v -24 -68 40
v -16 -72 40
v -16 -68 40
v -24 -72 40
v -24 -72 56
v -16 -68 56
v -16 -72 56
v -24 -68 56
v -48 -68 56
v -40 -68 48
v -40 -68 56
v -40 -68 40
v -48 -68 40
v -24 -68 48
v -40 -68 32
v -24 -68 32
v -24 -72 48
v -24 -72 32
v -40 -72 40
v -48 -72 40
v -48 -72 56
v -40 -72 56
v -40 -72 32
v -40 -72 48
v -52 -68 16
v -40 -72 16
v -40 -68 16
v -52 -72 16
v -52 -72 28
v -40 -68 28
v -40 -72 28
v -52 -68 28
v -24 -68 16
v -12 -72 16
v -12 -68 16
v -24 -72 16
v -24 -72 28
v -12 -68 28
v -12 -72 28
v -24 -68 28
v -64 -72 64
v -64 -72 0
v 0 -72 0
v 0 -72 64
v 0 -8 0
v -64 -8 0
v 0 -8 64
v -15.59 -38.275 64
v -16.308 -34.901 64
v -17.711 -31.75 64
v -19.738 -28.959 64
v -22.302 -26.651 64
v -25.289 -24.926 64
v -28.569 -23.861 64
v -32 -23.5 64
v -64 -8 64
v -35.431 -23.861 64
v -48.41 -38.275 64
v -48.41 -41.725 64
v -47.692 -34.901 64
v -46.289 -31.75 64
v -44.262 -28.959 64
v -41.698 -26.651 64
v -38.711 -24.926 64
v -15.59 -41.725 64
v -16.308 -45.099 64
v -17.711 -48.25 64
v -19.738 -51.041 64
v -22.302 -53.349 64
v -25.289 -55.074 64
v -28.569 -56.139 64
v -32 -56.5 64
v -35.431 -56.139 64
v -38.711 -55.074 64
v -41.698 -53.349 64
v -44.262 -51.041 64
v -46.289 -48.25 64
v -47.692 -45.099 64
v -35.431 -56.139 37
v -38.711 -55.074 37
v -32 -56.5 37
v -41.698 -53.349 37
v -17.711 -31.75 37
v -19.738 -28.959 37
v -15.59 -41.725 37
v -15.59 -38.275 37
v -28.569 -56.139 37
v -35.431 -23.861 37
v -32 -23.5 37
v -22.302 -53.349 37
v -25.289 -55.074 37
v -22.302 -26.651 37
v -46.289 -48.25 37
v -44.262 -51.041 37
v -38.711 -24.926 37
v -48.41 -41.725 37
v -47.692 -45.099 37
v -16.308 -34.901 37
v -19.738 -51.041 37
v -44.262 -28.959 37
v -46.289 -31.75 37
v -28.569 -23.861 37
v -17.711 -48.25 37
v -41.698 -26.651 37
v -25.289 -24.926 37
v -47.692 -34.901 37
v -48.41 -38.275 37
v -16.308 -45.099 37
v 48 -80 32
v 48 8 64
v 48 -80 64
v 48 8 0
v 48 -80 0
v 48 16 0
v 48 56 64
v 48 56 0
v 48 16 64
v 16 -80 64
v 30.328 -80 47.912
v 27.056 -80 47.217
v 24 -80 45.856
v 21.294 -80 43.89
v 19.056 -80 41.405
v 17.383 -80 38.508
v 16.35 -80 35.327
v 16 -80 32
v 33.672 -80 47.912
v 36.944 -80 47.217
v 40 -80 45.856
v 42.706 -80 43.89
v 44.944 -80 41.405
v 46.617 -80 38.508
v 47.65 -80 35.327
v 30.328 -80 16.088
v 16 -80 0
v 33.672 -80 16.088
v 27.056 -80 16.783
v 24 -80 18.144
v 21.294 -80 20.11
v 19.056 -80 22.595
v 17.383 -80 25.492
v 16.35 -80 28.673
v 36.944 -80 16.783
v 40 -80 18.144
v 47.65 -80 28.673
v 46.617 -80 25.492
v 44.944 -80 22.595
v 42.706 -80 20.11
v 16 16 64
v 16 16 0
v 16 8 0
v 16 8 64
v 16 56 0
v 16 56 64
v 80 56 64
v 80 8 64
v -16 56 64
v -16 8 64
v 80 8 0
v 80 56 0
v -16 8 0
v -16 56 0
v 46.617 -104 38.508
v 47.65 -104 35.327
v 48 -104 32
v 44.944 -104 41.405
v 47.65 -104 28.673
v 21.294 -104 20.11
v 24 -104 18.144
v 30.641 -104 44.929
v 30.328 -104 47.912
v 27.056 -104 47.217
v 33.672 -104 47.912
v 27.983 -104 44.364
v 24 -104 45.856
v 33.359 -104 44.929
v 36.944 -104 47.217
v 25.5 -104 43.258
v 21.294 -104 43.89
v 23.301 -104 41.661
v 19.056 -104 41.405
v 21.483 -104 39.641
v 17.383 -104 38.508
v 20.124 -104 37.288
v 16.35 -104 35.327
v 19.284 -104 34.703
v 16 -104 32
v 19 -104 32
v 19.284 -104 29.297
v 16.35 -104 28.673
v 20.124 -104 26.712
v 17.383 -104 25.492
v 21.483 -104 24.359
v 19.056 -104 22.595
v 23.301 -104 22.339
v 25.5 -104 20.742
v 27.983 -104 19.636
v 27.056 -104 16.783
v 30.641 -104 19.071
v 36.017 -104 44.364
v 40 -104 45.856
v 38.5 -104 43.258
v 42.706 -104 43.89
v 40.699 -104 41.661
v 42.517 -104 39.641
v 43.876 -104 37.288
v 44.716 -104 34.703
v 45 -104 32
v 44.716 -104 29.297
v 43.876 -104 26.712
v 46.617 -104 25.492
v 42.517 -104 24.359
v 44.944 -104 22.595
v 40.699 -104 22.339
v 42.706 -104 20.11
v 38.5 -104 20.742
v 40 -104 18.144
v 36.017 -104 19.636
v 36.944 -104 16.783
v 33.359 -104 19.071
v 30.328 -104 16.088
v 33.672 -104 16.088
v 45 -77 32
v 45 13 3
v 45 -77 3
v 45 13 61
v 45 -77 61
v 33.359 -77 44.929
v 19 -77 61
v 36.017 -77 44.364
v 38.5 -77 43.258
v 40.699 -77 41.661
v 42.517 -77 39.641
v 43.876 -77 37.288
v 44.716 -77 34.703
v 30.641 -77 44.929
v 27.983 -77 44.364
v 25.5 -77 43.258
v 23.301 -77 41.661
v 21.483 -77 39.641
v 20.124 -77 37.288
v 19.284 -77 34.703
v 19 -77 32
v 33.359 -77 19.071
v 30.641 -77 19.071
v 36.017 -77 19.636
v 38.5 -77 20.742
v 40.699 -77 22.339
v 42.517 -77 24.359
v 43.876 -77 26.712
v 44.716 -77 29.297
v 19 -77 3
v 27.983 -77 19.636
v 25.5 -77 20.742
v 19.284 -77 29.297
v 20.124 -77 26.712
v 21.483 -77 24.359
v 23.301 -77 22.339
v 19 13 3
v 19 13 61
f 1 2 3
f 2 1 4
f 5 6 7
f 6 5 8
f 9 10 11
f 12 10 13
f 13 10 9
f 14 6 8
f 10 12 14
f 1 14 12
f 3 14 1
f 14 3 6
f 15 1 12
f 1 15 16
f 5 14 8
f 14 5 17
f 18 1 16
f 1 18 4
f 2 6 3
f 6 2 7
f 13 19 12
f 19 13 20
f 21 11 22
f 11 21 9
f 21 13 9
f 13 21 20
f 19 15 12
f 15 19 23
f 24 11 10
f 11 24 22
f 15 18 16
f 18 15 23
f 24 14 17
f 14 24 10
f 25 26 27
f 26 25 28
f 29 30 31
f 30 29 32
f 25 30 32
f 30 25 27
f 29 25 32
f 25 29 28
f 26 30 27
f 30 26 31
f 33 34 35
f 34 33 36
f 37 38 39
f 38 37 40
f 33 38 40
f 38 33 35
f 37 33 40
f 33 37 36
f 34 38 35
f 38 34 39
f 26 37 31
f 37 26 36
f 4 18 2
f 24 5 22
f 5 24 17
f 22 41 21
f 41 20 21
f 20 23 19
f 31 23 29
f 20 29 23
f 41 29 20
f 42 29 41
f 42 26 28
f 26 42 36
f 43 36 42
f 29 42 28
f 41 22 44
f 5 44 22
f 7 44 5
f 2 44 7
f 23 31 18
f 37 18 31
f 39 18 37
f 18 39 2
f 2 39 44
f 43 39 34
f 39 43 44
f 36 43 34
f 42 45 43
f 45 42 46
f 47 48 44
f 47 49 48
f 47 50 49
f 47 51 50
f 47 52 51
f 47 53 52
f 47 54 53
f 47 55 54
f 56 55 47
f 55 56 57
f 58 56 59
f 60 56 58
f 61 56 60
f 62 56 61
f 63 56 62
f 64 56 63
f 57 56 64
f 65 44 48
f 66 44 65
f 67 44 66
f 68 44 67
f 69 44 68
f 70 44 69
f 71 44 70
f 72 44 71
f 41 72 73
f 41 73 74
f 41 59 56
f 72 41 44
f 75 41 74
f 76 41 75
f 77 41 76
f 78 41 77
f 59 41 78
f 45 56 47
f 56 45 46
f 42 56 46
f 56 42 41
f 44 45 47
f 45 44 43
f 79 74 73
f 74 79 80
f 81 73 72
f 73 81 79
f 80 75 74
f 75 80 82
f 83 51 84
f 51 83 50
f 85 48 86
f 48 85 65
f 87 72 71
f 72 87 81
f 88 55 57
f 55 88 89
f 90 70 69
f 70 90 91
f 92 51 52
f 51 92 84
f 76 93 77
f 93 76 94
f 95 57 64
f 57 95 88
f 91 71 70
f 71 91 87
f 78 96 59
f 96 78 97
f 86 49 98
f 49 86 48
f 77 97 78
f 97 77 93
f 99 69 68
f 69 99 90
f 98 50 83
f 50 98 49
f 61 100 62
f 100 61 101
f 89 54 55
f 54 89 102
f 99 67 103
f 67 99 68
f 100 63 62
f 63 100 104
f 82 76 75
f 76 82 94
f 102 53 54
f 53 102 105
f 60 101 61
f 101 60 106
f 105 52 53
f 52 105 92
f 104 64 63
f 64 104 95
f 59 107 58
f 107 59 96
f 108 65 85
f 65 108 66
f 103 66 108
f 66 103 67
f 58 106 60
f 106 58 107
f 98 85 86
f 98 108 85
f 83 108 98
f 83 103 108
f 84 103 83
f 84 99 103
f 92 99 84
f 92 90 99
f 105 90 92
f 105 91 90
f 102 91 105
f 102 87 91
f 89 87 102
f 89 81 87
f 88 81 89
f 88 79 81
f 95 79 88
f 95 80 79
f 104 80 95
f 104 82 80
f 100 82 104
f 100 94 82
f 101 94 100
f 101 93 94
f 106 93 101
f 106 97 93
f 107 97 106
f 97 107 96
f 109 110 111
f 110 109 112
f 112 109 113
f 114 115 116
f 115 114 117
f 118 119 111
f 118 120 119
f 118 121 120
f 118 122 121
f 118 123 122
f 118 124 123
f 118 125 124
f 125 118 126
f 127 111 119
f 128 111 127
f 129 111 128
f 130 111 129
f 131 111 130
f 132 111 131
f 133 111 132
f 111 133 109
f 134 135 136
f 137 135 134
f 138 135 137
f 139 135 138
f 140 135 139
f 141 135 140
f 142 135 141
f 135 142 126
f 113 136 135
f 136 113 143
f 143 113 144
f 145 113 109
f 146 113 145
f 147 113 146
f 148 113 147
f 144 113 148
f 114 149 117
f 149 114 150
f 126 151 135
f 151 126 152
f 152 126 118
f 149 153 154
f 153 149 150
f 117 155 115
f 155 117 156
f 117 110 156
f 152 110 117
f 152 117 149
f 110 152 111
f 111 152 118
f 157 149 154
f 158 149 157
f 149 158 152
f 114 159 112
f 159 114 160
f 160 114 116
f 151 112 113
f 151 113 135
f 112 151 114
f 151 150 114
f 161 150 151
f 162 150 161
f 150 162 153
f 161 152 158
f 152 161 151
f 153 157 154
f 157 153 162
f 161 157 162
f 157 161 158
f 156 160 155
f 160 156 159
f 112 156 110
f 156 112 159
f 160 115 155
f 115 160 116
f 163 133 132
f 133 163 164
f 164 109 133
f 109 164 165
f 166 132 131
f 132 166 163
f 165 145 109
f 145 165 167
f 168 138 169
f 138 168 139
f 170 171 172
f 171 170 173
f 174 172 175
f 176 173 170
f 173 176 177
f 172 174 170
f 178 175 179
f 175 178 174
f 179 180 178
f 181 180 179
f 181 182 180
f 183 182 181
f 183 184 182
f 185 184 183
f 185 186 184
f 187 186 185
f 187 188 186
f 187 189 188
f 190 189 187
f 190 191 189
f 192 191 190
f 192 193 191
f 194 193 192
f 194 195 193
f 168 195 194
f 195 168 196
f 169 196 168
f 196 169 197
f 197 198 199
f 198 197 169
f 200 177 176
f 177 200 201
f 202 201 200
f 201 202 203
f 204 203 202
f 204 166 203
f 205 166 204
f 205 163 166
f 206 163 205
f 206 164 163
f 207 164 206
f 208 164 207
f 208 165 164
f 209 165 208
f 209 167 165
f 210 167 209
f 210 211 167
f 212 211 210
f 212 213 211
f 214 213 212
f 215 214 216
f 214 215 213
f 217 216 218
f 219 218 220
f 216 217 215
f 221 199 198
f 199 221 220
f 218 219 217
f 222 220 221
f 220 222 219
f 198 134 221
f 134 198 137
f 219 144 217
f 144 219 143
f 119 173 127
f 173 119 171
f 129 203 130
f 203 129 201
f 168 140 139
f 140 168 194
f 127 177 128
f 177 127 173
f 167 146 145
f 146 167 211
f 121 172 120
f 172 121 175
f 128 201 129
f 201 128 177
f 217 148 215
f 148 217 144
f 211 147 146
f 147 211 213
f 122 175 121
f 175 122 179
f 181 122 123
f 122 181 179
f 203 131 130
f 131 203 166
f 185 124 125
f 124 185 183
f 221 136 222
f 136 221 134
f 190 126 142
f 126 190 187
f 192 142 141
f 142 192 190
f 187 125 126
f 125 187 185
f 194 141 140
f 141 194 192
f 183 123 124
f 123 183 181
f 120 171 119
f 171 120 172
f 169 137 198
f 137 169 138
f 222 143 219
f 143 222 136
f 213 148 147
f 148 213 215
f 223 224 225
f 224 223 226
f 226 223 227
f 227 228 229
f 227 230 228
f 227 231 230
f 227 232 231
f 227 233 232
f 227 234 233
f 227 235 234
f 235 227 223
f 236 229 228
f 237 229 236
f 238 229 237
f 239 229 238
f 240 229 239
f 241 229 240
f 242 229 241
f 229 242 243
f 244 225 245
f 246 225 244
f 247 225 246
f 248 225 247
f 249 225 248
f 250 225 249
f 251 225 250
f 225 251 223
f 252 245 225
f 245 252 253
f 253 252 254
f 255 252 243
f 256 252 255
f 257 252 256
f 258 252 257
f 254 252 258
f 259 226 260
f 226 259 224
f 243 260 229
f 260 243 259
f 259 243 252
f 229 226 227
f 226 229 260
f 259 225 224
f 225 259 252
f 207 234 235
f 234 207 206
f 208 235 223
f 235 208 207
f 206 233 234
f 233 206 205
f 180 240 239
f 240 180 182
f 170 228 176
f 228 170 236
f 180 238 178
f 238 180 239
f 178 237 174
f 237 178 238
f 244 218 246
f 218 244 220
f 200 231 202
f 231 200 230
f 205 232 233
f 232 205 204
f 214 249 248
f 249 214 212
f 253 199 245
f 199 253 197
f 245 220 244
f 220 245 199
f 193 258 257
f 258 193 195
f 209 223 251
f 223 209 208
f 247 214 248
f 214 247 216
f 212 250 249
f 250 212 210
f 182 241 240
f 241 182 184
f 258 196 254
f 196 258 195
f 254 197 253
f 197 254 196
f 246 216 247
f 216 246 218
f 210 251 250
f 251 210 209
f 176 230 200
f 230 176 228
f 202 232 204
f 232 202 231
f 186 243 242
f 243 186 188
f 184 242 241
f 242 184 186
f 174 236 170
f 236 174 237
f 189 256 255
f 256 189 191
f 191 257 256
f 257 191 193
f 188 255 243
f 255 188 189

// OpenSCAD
b=8;   // Scale factor. A creeper is 24 of these high
w=3;   // Wall thickness in mm
t=0.5; // Tolerance between neck and head

echo("Total body height is",5*b+12*b+3*b);
echo("Total head height is",8*b);
echo("Total width is",8*b);

// Simple creeper body
module body() {
    cube([4*b,8*b,12*b]);
    translate([-4*b,0,-5*b]) cube([4*b,8*b,6*b]);
    translate([4*b,0,-5*b]) cube([4*b,8*b,6*b]);
} 

// The negative space to hollow out the creeper body
module tummy() {
    translate([w,w,w]) cube([4*b-2*w,8*b-2*w,12*b-2*w]);
    translate([2*b,4*b,12*b-w]) cylinder(r=2*b-w,h=w+4*b);
}

// The body with a neck added and the tummy removed
module body2() {
    layer=0.6; // Layer thickness used to make thin disks for support
    difference() {
        union() {
            body();
            translate([2*b,4*b,12*b-w]) cylinder(r=2*b,h=w+3*b);
        }
        tummy();
    }
    // Some discs for support
    //translate([2*b,4*b,12*b-w]) cylinder(r=2*b,h=layer);
    //translate([2*b,4*b,13.5*b+layer]) cylinder(r=2*b,h=layer);
    //translate([2*b,4*b,15*b-layer]) cylinder(r=2*b,h=layer);
}

// The negative space to make the creeper face
module face(){
    translate([7.5*b,0,0]) {
        translate([0,2*b,1*b]) cube([2*b,1*b,2*b]);
        translate([0,5*b,1*b]) cube([2*b,1*b,2*b]);
        translate([0,3*b,2*b]) cube([2*b,2*b,2*b]);
        translate([0,5*b,4.5*b]) cube([2*b,1.5*b,1.5*b]);
        translate([0,1.5*b,4.5*b]) cube([2*b,1.5*b,1.5*b]);    
    }
}

// Simple creeper head
module head(){
    difference() {
        cube([8*b,8*b,8*b]);
        face();
    }
}

// Head with a hole for the neck
module head2(){
    difference(){
        head();
        translate([4*b,4*b,0]) cylinder(r=2*b+t,h=w+3*b);
    }
}

// Show the assembled creeper
module creeper() {
    body2();
    translate([-2*b,0,12*b]) head2();
}

//body();
//tummy();
//head2();
//body2();
//creeper();

// These next lines show both pieces in print orientation
translate([0,-b,8*b]) rotate([0,-180,90]) head2();
translate([2*b,2*b,0]) rotate([90,0,0]) body2();

// Make a small piece to print an overhang test
/*
translate([-2*b, 12*b,0]) difference() {
  rotate([90,0,0]) tummy2();
  translate([-5*b,-10*b,-b]) cube([14*b, 24*b, 10*b]); // Just leave the neck
  //translate([-5*b,-16*b,4*b]) cube([14*b, 24*b, 10*b]); // Cross section
}
*/
